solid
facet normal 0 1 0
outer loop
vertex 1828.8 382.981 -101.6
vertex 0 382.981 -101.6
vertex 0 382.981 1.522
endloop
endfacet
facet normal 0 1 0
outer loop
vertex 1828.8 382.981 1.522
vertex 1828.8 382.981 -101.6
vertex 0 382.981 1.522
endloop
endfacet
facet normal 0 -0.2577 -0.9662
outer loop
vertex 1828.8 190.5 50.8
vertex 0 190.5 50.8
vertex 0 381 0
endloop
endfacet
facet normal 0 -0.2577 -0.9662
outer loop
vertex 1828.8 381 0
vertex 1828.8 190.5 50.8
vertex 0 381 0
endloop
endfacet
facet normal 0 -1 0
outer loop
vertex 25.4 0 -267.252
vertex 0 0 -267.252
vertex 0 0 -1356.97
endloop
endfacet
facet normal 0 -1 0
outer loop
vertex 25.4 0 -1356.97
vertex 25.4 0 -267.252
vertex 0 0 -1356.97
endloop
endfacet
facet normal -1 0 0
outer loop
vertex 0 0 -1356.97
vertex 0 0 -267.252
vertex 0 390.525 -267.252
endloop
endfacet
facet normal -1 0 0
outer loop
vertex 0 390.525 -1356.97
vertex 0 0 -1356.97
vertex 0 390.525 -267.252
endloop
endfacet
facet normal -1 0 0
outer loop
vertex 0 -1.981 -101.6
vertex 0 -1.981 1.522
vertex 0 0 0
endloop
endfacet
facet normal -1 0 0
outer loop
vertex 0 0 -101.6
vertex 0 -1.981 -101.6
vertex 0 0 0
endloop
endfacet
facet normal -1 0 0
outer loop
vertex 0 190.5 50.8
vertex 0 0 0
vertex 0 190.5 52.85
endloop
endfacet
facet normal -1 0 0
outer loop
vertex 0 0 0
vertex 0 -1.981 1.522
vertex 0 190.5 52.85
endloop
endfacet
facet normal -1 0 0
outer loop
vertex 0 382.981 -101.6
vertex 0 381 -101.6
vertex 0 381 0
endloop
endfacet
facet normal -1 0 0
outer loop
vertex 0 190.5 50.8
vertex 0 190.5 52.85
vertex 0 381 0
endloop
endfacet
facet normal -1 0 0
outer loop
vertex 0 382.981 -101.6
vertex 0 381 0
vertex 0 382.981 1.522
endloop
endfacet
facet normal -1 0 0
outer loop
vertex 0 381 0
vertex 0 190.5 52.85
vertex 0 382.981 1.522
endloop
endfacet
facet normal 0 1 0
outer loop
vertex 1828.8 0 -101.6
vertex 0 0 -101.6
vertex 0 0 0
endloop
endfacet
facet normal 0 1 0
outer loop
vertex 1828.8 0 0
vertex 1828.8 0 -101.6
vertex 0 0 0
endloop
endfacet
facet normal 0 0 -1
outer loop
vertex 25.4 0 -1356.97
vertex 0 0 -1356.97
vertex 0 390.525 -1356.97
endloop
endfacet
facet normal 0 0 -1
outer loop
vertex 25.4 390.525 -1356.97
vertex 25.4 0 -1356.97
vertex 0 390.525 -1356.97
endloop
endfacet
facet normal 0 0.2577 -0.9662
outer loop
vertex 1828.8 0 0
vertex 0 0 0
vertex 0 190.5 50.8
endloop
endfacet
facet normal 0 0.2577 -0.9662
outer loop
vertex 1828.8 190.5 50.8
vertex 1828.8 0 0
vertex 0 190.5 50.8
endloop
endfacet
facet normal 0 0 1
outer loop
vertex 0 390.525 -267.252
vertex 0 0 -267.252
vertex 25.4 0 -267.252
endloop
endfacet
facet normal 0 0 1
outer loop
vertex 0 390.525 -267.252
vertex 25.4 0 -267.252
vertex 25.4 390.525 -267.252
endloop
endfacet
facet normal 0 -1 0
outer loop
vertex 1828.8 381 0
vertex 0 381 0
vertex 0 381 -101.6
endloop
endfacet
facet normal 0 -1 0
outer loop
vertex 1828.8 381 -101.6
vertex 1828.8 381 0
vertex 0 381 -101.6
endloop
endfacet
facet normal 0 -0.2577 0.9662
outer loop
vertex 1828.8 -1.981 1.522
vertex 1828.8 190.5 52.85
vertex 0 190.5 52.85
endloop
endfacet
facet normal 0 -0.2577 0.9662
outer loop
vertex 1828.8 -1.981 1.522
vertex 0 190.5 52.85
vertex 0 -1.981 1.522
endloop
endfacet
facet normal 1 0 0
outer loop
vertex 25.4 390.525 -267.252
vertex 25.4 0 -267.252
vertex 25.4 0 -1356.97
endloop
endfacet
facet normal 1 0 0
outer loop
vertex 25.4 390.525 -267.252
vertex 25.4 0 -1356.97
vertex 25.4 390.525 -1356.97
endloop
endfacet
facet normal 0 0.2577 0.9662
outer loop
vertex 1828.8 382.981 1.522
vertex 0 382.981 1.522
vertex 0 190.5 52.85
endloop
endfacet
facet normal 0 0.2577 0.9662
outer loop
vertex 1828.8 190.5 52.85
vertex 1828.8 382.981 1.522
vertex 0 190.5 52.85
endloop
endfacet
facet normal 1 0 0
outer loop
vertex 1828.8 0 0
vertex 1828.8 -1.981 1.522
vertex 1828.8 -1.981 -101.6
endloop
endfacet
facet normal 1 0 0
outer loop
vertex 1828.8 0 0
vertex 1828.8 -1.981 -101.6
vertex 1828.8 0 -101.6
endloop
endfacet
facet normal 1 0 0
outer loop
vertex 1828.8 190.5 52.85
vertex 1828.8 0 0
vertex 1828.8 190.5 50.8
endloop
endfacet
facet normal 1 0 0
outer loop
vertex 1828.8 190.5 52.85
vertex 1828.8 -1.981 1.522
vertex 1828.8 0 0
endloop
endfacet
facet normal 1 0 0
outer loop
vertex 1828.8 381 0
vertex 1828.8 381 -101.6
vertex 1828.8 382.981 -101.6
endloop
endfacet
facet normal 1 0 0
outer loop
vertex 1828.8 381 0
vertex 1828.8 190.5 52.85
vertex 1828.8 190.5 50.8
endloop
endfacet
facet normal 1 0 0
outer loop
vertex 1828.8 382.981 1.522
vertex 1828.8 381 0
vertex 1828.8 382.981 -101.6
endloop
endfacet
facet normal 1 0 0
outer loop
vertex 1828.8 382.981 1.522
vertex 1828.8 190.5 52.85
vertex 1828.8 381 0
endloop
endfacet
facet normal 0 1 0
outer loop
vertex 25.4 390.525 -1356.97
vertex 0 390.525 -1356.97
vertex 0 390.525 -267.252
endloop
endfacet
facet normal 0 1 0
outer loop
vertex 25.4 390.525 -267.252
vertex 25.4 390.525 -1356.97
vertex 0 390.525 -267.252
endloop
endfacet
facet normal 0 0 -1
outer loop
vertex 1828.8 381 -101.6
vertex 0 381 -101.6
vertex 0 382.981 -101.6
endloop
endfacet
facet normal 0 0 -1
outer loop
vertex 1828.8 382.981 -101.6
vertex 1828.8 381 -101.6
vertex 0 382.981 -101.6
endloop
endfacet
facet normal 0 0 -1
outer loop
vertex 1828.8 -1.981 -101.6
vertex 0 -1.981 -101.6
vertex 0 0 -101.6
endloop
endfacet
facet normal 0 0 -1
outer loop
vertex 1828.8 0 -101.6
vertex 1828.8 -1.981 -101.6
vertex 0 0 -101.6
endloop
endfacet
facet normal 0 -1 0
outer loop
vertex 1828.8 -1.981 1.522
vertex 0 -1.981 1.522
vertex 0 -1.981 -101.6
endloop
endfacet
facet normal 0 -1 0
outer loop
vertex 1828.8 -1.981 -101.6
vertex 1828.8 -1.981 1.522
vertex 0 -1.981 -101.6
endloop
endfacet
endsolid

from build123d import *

# Parameters (mm, degrees)
F1_DEPTH = 1828.8
F0_W     = 390.525
F0_H     = 609.6
F0_H_2   = 480.117866
F2_DEPTH = 25.4


with BuildPart() as f1:
    # F0 (on Right) → F1 (new body)
    with BuildSketch(Plane.YZ):
        Polygon((0, 0), (190.5, 50.8), (381, 0), (381, -101.6), (382.9812, -101.6), (382.9812, 1.522113), (190.5, 52.850433), (-1.9812, 1.522113), (-1.9812, -101.6), (0, -101.6), align=None)
    extrude(amount=F1_DEPTH)

    # F0 (on Right) → F2 (join)
    with BuildSketch(Plane.YZ):
        Polygon((0, 0), (190.5, 50.8), (381, 0), (381, -101.6), (382.9812, -101.6), (382.9812, 1.522113), (190.5, 52.850433), (-1.9812, 1.522113), (-1.9812, -101.6), (0, -101.6), align=None)
        with Locations((195.2625, -572.051987)):
            Rectangle(F0_W, F0_H)
        with Locations((195.2625, -1116.91092)):
            Rectangle(F0_W, F0_H_2)
    extrude(amount=F2_DEPTH)


solid = f1.part
